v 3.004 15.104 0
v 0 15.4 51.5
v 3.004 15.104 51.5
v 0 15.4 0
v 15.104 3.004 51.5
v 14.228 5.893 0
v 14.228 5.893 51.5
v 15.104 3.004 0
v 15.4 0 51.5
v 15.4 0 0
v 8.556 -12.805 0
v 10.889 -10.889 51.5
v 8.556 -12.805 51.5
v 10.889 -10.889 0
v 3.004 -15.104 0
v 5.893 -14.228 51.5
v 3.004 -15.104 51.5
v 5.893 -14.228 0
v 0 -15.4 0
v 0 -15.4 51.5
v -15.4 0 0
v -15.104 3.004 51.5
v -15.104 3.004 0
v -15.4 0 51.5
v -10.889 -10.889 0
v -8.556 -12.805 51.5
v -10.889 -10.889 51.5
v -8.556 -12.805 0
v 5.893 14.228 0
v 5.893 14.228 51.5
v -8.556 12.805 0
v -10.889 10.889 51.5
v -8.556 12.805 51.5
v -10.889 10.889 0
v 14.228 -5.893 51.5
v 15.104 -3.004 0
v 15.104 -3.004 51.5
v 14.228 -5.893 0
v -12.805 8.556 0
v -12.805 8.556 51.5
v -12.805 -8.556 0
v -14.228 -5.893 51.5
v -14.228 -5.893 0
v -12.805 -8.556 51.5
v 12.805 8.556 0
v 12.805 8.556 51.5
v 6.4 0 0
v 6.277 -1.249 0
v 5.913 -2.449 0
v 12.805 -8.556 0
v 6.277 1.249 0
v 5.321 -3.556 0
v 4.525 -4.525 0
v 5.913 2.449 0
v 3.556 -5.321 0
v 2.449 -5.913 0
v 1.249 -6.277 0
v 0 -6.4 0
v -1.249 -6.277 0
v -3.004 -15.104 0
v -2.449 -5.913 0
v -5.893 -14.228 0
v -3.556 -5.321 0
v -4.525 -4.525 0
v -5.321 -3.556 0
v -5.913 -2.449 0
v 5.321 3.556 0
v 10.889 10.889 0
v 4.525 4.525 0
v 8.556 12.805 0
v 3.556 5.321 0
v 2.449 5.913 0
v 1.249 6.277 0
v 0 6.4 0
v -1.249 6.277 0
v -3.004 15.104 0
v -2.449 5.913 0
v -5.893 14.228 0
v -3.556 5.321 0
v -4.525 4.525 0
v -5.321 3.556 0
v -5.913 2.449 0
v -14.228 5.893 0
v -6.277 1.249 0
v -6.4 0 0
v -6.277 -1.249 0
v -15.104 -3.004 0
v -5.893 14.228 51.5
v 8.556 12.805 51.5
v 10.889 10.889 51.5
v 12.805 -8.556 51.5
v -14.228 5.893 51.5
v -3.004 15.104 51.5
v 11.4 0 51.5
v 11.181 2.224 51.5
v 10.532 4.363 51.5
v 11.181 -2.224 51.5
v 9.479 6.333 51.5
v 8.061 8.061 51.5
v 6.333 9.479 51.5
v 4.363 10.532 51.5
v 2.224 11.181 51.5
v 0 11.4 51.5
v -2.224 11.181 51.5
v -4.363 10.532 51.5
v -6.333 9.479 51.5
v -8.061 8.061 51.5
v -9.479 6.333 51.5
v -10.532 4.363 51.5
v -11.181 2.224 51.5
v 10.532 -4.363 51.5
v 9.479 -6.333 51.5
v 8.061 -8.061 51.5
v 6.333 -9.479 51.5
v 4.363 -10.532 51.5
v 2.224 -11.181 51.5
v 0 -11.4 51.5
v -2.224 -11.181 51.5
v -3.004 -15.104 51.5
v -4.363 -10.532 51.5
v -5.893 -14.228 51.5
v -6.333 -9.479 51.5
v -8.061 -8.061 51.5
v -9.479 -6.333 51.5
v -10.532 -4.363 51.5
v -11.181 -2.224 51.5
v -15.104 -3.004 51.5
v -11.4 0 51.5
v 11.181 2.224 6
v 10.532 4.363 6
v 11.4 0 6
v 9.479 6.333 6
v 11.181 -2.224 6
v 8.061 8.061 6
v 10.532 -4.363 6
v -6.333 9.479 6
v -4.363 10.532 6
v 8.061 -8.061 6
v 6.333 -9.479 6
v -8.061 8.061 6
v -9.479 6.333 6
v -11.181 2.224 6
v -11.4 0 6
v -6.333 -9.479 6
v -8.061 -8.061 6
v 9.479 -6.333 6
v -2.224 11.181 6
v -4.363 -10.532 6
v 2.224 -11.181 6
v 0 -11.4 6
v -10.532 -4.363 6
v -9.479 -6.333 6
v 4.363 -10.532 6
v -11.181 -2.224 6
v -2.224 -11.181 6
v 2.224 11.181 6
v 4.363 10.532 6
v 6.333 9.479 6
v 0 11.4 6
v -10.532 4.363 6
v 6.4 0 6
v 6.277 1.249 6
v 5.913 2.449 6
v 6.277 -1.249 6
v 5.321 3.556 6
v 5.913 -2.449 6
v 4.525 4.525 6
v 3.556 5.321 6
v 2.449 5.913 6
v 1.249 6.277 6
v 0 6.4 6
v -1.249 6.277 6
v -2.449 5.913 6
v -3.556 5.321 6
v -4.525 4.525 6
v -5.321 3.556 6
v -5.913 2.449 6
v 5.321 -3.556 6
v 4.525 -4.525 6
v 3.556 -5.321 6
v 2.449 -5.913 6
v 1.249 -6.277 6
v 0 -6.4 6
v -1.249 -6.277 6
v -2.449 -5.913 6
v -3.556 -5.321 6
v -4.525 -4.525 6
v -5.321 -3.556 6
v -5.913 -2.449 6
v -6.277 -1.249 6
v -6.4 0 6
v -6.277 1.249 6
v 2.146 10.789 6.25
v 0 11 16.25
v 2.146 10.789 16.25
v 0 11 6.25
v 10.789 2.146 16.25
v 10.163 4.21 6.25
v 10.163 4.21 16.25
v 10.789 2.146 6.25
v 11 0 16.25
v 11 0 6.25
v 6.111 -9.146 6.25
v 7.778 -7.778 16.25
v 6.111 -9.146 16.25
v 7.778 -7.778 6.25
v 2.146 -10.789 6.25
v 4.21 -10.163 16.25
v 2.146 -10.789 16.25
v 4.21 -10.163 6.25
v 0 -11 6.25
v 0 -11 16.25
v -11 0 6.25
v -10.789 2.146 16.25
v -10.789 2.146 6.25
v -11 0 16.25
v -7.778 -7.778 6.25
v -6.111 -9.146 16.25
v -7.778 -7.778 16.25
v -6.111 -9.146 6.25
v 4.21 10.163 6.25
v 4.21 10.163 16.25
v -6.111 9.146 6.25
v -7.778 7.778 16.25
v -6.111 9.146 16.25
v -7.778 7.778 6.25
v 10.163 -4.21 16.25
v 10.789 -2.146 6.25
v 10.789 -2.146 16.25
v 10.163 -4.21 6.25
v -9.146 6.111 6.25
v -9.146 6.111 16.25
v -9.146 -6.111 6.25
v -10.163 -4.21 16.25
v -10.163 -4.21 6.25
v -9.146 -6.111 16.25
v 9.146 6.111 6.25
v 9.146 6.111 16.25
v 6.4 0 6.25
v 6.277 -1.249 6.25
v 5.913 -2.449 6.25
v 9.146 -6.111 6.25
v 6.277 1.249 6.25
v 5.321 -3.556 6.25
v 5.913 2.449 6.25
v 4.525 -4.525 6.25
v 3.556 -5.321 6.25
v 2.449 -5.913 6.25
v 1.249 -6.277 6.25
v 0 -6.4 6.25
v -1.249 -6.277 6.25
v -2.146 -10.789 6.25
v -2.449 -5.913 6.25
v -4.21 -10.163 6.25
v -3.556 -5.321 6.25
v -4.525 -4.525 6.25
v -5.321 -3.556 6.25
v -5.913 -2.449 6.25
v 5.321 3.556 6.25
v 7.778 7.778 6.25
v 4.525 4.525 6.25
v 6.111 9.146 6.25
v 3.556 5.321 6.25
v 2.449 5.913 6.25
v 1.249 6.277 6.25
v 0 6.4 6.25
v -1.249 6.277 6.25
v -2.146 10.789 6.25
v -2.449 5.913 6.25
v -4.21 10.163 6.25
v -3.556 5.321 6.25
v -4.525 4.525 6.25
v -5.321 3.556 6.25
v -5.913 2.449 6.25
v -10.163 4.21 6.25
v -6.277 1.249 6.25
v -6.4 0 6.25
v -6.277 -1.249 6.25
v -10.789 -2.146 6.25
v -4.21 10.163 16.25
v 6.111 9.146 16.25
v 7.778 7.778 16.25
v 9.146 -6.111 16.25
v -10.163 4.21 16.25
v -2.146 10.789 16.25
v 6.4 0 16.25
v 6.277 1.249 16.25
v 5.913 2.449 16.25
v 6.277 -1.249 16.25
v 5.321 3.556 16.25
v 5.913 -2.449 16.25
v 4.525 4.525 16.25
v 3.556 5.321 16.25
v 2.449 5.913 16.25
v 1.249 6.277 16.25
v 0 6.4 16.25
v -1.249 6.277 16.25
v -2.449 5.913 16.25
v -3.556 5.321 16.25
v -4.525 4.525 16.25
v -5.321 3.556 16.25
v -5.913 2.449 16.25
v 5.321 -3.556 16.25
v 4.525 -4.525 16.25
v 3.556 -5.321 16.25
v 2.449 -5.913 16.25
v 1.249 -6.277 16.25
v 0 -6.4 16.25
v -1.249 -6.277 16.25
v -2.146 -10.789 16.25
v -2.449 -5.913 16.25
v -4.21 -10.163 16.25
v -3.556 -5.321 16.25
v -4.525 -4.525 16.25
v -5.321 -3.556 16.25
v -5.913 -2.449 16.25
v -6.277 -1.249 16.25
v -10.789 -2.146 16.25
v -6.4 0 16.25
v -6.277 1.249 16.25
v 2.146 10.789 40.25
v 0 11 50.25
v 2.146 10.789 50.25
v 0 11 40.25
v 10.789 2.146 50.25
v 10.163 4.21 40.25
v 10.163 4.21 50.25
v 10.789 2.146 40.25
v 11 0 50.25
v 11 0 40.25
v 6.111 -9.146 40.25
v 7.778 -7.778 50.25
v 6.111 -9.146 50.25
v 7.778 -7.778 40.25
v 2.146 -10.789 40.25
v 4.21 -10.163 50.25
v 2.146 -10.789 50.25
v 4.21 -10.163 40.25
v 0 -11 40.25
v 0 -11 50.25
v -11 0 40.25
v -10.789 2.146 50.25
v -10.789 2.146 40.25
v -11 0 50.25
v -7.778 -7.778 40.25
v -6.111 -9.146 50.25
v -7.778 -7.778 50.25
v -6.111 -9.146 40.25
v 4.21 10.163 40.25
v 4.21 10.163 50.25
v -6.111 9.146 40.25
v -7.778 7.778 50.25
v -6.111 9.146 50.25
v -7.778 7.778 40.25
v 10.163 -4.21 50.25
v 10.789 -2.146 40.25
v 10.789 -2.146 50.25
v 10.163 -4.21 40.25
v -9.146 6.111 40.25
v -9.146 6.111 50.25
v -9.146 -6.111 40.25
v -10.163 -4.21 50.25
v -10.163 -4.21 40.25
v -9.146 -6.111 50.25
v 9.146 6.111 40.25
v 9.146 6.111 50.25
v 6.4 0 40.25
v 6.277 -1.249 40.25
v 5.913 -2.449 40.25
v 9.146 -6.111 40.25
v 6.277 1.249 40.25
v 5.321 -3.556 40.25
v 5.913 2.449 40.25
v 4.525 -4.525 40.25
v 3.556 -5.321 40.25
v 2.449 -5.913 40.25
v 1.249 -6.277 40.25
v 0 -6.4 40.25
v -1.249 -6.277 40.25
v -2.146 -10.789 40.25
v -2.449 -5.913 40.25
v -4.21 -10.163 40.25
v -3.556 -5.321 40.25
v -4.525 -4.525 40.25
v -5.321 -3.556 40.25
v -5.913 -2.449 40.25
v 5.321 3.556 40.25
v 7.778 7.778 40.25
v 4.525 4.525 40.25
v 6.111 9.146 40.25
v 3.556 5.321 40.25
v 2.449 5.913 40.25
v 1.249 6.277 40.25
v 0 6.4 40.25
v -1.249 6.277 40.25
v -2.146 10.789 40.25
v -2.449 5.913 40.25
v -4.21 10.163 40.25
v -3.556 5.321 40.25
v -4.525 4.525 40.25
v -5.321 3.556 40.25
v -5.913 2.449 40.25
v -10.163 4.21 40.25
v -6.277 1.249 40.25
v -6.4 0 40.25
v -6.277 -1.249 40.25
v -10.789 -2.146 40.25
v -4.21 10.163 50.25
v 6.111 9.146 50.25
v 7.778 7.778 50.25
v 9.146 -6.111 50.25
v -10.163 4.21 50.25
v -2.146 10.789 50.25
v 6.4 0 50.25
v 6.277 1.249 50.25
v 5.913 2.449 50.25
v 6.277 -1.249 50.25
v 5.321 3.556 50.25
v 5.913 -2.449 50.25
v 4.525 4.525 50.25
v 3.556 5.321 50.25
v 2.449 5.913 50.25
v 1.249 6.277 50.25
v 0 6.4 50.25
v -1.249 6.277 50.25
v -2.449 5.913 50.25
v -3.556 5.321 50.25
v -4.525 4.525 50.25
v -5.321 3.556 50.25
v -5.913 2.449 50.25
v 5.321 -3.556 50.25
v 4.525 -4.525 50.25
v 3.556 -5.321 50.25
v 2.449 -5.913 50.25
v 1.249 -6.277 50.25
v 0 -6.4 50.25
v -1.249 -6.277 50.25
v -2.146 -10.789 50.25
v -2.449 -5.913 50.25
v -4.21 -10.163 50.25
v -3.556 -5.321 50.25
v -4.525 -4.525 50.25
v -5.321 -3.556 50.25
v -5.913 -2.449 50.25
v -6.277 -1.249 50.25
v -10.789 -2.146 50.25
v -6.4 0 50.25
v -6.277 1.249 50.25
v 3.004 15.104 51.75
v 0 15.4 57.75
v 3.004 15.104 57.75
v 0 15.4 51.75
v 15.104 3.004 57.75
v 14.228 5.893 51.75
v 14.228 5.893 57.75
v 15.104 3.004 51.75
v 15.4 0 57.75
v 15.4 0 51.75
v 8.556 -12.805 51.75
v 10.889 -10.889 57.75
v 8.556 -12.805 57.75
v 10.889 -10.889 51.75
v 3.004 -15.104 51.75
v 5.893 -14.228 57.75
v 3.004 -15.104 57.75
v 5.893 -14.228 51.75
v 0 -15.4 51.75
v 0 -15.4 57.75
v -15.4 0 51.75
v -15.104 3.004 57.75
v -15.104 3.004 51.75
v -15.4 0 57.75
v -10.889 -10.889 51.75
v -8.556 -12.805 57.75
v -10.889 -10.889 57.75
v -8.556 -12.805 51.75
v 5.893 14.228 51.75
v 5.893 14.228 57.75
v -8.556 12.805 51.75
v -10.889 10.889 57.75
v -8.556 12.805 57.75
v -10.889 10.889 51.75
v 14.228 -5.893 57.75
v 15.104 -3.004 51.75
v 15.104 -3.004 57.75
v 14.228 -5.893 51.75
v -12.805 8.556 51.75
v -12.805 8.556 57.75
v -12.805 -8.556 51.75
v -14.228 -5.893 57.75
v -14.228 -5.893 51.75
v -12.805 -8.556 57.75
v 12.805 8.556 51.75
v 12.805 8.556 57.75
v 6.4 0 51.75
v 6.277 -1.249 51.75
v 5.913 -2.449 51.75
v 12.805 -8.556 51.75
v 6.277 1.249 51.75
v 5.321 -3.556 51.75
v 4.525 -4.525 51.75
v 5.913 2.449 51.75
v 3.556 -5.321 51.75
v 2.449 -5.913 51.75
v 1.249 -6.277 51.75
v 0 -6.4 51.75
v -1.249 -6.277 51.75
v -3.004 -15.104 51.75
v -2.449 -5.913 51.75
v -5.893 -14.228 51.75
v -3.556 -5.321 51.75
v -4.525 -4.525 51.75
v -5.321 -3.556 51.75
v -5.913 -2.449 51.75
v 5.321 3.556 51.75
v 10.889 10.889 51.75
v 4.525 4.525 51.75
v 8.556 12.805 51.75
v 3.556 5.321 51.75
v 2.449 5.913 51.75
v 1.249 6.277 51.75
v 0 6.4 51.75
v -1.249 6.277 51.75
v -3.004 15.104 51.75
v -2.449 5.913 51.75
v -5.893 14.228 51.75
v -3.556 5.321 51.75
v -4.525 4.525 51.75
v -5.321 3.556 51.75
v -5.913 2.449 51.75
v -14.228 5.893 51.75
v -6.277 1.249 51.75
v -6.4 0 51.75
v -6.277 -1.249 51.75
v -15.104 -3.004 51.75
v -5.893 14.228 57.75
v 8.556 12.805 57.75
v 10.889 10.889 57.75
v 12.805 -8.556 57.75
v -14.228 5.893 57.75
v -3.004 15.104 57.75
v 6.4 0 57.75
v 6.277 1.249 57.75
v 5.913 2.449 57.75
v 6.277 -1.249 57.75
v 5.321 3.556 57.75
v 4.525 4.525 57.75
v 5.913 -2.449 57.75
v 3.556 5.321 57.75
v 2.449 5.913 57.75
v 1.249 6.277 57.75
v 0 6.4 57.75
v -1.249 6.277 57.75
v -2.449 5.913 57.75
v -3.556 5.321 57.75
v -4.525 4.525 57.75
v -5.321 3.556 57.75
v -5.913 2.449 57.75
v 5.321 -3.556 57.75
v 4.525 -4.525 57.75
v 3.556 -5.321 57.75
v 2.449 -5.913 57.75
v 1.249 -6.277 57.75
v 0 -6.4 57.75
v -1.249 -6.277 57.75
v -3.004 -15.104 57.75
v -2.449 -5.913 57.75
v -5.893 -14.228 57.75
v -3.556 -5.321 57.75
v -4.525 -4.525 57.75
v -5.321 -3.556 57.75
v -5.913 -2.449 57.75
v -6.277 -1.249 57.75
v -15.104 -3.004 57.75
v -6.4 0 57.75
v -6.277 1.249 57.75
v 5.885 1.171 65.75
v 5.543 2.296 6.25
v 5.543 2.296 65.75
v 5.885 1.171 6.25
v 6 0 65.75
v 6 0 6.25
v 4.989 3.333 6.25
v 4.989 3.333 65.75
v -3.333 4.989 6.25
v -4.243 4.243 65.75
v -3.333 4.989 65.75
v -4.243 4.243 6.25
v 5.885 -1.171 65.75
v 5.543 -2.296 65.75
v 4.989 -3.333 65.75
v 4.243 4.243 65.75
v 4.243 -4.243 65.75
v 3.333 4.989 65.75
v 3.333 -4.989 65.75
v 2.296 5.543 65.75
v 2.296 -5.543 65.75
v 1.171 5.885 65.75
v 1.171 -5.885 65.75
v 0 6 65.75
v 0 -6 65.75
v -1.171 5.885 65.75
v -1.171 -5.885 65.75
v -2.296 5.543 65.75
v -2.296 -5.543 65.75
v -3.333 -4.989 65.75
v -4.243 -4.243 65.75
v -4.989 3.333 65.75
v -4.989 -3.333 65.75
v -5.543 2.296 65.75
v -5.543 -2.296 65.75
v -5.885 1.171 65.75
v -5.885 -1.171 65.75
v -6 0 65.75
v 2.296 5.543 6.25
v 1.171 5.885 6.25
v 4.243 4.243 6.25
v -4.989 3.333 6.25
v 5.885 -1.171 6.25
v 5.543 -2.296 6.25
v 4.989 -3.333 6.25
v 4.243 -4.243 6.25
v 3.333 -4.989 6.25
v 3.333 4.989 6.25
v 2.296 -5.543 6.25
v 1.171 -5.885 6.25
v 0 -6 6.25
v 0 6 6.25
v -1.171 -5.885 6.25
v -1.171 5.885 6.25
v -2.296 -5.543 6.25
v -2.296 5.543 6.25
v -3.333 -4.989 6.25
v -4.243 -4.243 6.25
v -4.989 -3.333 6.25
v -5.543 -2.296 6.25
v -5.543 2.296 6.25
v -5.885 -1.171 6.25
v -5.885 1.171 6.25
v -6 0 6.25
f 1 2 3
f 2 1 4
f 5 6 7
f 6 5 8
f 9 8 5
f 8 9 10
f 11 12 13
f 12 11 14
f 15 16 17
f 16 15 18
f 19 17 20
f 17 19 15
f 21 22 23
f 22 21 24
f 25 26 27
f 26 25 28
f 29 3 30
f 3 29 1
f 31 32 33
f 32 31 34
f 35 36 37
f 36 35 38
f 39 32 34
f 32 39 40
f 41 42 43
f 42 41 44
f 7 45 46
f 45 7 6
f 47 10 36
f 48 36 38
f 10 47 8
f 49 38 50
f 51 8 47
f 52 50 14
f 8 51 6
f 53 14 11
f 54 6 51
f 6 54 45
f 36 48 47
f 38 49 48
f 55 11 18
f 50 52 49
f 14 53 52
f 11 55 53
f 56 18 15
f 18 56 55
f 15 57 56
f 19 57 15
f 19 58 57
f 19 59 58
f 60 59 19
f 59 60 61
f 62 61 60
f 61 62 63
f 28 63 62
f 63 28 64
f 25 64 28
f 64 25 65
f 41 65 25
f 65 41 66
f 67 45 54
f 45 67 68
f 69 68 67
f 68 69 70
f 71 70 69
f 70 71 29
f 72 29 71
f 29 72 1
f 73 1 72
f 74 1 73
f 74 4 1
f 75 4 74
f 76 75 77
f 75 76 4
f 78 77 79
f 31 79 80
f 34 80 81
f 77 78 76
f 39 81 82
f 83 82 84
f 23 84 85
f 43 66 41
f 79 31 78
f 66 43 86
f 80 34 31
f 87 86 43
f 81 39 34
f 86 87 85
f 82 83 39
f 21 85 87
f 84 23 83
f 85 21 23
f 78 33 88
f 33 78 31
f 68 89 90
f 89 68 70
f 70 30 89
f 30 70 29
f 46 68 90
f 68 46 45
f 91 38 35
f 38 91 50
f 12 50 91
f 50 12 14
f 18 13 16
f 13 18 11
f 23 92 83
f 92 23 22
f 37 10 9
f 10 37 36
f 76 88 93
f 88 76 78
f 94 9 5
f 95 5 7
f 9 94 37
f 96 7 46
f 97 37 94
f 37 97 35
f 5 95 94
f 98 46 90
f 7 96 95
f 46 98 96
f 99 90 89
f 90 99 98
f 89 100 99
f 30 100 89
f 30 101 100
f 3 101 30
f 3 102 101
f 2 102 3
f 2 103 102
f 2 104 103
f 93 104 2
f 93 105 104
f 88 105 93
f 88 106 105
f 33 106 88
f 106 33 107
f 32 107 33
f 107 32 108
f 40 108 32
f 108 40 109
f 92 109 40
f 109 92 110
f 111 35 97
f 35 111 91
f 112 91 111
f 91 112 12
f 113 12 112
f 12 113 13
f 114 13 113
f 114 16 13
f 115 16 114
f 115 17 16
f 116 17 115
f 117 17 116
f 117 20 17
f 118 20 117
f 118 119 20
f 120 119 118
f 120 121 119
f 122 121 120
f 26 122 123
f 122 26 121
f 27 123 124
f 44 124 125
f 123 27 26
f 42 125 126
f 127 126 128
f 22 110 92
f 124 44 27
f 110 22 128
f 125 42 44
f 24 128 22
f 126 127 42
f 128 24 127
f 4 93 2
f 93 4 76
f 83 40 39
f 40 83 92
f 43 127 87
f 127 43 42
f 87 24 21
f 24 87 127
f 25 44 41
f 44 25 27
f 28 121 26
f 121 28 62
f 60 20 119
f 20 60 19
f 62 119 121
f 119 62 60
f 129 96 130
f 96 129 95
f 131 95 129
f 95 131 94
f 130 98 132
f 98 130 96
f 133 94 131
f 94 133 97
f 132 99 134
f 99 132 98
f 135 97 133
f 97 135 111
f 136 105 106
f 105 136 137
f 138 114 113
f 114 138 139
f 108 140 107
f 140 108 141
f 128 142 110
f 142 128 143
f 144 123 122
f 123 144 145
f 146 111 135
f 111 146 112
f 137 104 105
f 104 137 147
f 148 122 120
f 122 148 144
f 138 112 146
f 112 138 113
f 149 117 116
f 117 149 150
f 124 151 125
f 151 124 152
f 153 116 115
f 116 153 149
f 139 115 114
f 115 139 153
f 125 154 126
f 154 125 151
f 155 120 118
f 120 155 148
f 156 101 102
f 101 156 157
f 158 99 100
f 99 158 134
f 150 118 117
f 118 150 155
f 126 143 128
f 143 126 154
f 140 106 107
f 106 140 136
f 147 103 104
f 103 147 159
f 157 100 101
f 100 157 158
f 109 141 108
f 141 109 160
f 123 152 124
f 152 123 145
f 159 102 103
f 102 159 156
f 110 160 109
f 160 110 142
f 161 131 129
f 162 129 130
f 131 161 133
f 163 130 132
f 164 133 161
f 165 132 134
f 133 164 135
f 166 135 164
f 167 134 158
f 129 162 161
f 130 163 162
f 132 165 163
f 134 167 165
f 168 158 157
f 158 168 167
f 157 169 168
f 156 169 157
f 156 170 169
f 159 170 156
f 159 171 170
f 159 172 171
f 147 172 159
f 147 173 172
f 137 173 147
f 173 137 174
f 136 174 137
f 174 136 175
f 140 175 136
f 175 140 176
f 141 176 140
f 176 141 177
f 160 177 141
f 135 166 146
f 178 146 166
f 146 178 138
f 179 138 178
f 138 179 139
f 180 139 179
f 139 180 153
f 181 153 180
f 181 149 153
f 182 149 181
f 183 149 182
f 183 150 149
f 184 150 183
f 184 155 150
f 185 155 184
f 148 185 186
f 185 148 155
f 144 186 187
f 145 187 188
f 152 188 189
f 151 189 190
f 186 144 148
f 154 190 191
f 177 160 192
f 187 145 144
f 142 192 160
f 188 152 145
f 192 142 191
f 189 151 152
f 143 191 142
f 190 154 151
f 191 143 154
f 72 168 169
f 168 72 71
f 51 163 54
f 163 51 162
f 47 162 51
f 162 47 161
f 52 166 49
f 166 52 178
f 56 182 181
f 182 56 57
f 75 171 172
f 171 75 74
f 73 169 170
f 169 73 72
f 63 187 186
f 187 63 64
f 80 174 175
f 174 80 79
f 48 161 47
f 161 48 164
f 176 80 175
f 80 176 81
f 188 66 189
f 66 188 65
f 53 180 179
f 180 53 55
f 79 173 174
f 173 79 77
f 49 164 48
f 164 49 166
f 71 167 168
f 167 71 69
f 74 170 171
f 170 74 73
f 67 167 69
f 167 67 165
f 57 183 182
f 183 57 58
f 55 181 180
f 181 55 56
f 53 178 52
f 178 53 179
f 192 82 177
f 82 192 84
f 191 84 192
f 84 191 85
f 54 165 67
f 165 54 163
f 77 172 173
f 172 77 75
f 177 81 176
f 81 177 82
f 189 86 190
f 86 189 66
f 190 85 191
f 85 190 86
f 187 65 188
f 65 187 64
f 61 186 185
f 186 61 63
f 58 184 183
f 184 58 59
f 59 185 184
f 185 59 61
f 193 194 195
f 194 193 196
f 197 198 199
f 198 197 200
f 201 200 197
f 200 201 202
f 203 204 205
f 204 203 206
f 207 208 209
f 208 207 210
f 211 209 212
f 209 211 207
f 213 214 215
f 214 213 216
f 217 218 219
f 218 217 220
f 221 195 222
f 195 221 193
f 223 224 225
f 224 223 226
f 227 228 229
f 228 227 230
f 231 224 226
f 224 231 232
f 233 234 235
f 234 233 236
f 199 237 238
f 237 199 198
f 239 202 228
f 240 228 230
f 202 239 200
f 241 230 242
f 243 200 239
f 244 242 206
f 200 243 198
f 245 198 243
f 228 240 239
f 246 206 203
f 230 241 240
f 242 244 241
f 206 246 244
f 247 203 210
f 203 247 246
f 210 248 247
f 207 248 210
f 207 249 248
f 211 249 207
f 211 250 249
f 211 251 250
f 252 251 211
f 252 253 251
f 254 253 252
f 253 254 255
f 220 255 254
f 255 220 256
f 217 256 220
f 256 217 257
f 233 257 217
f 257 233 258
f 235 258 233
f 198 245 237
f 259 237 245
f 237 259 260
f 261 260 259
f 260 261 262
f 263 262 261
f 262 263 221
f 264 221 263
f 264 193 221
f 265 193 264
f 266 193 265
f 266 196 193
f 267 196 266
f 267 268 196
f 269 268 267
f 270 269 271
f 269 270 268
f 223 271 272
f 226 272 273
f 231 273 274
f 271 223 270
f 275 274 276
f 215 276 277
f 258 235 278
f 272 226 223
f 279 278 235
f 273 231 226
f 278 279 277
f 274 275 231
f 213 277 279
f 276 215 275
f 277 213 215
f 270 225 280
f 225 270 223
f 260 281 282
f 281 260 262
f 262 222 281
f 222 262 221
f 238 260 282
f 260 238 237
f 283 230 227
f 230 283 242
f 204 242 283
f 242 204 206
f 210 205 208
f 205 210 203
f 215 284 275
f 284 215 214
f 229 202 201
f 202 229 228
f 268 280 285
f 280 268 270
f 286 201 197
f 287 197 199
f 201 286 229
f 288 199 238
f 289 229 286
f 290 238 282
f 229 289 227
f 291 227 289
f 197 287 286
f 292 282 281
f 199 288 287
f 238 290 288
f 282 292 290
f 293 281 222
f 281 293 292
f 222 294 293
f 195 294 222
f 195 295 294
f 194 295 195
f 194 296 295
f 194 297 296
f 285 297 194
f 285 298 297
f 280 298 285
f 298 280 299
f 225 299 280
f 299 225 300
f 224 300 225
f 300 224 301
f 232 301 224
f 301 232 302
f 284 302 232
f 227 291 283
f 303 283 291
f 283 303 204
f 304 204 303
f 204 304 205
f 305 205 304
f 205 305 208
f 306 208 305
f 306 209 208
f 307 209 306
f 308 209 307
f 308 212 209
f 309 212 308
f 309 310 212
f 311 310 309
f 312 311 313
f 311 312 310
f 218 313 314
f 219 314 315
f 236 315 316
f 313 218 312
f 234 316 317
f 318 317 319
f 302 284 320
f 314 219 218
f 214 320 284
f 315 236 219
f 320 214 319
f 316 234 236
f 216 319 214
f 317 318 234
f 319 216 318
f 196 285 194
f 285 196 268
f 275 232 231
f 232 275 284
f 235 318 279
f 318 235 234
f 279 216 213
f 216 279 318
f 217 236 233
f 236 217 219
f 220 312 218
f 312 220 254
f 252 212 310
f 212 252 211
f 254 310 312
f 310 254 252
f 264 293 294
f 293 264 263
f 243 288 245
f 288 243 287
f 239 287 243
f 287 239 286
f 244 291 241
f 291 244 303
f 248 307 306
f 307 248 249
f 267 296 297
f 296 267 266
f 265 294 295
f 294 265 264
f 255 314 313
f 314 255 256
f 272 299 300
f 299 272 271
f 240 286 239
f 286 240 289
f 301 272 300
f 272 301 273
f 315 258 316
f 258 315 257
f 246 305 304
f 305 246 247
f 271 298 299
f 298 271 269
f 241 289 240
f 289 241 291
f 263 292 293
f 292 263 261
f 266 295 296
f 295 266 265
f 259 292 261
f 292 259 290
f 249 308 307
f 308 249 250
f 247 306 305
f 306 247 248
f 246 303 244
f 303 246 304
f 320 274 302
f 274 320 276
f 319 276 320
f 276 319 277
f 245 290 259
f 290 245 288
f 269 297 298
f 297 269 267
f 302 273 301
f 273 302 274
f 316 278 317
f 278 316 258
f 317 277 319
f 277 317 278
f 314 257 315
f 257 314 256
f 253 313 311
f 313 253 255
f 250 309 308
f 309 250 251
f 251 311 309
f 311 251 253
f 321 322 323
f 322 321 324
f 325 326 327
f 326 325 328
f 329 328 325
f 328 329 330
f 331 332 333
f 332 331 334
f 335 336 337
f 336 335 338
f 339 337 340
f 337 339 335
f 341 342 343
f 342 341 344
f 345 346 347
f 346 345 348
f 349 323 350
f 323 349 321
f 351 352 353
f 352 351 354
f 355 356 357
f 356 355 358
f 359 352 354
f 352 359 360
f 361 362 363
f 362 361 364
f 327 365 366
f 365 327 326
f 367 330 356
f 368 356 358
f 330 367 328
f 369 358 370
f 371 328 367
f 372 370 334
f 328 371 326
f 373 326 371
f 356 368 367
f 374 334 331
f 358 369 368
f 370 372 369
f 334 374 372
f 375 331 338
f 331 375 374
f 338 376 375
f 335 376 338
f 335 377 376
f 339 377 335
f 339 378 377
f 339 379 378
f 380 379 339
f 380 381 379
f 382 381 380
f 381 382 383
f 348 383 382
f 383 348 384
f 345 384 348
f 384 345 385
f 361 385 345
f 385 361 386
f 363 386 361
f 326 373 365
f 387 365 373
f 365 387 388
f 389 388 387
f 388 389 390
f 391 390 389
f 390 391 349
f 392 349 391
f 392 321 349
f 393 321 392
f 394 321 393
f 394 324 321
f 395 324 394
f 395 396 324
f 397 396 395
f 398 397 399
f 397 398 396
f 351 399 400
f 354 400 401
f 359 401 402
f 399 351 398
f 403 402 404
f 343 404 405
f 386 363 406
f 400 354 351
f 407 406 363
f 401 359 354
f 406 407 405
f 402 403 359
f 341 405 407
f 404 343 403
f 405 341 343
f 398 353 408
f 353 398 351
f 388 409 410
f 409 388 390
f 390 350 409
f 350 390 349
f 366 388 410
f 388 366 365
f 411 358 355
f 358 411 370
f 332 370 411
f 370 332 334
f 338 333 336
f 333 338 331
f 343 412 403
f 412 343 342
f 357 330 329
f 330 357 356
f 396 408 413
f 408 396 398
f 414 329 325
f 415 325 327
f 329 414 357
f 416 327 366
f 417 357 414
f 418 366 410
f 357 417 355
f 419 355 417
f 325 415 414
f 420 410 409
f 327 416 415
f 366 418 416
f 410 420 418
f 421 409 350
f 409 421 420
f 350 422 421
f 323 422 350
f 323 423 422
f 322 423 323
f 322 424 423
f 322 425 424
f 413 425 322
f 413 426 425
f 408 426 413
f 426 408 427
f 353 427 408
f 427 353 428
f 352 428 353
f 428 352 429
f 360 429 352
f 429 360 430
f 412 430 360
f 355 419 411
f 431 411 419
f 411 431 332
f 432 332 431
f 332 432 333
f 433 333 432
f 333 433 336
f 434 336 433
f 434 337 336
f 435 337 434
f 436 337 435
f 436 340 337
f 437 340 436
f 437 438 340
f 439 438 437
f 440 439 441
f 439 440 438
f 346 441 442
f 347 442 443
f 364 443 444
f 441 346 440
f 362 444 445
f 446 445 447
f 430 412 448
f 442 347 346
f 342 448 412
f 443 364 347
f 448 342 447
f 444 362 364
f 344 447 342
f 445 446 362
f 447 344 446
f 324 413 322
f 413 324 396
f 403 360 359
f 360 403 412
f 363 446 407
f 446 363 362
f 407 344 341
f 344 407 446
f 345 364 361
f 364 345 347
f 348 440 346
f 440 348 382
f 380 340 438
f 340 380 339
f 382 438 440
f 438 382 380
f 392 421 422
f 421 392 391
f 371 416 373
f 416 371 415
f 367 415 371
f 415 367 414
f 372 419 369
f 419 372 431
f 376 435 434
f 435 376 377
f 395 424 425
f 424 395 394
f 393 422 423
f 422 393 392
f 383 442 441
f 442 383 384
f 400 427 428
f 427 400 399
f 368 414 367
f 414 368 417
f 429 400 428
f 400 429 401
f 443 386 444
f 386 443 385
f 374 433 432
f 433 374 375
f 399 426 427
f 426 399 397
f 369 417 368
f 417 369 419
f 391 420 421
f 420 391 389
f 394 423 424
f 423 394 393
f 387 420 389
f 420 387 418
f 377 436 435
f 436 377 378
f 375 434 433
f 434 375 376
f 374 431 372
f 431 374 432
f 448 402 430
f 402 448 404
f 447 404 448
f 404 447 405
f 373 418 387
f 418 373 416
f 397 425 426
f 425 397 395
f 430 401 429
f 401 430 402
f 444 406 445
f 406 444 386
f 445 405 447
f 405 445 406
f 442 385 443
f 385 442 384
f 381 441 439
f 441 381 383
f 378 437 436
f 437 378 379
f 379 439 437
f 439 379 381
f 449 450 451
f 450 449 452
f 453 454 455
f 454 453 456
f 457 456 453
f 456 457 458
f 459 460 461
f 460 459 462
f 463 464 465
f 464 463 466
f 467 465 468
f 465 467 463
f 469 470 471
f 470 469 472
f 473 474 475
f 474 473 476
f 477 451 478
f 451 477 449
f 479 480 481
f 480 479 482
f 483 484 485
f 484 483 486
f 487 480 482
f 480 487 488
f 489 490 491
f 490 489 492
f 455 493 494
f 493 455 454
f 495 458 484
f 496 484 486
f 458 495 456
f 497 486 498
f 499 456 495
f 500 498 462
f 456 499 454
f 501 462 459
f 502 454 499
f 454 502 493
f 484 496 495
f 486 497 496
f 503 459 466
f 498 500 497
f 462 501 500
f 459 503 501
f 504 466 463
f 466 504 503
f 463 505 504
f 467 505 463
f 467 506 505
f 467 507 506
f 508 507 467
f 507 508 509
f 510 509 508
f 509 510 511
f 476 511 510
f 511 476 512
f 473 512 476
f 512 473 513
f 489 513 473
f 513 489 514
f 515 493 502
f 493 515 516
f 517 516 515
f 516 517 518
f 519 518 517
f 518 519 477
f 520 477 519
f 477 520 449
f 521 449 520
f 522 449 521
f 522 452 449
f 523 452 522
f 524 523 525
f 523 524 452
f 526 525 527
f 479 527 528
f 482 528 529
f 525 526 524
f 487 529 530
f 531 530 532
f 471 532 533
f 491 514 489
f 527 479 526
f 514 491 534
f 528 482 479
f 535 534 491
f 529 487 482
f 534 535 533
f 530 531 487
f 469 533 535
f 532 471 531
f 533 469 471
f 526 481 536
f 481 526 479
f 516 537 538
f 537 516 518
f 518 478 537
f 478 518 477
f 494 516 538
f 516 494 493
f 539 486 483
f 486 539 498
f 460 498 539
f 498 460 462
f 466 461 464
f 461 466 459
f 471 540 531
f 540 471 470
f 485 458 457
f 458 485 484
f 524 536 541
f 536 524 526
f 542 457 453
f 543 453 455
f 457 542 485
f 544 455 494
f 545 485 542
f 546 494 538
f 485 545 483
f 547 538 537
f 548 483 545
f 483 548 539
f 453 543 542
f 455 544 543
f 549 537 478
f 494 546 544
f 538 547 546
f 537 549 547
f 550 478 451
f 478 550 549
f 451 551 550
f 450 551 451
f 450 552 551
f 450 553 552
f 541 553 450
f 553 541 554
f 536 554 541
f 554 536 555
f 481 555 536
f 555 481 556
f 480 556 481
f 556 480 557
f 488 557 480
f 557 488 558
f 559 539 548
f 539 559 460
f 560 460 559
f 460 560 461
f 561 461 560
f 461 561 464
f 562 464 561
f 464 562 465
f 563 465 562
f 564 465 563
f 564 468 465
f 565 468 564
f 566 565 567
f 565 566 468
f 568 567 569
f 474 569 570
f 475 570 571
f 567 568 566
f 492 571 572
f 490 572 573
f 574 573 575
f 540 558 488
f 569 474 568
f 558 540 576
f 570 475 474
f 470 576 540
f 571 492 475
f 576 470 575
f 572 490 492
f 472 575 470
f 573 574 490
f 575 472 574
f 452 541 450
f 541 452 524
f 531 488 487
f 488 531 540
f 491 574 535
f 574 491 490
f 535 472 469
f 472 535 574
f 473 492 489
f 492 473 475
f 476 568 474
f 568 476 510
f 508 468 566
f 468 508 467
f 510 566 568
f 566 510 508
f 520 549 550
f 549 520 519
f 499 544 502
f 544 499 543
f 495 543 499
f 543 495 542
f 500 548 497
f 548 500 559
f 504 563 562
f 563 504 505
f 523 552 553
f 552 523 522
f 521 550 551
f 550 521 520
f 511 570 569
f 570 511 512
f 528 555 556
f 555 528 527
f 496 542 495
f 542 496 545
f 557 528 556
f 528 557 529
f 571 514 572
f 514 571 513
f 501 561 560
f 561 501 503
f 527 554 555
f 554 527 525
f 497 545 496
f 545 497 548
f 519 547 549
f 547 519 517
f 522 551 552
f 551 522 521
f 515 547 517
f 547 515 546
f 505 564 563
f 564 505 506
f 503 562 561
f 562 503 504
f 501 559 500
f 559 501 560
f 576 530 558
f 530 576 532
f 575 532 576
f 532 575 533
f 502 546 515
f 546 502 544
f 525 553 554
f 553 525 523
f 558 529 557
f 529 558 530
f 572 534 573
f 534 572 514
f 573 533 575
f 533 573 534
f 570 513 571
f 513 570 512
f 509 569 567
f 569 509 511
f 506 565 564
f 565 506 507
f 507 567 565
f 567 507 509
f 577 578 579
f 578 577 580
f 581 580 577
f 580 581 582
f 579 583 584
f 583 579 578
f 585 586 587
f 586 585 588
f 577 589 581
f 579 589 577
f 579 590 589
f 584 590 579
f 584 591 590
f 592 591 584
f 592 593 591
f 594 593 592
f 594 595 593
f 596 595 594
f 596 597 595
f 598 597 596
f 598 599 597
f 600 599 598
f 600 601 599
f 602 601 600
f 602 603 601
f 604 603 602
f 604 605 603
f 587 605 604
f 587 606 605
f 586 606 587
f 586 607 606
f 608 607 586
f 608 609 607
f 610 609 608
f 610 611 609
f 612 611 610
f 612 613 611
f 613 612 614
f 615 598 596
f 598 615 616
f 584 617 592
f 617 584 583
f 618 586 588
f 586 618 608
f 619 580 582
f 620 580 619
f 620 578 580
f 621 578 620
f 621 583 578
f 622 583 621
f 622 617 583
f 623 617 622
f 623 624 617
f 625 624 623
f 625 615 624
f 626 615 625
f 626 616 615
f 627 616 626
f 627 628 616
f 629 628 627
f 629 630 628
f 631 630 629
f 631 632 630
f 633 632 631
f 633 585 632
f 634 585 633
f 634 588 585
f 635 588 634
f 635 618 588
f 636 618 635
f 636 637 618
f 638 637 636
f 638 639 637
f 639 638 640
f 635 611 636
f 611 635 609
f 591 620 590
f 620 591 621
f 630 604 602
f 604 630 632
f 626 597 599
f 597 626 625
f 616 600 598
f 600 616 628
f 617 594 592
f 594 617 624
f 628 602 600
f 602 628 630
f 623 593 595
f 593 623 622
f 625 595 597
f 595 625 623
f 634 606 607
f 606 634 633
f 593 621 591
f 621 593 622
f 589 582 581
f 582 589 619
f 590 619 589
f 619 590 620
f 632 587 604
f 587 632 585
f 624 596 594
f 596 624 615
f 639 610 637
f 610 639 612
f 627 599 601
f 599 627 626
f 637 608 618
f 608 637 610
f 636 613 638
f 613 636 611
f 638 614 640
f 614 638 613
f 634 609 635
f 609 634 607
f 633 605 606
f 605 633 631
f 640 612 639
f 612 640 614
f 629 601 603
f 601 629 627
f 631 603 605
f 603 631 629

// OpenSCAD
$fn = 32;

// ------------------------------------------------------------------------
// Shaft station: cup d30.8 x 51.5 mm, shaft d12
// Every part is its own module, assembly() places every instance.
// ------------------------------------------------------------------------

// --- part 1 ---
module housing_cup() {
  difference() {
    cylinder(h = 51.5, d = 30.8);
    translate([0, 0, 6]) cylinder(h = 46.5, d = 22.8);
    translate([0, 0, -1]) cylinder(h = 8, d = 12.8);
  }
}

// --- part 2 ---
module bearing_lower() {
  difference() {
      translate([0, 0, 0]) cylinder(h = 10, d = 22);
      translate([0, 0, -1]) cylinder(h = 12, d = 12.8);
    }
}

// --- part 3 ---
module bearing_upper() {
  difference() {
      translate([0, 0, 0]) cylinder(h = 10, d = 22);
      translate([0, 0, -1]) cylinder(h = 12, d = 12.8);
    }
}

// --- part 4 ---
module station_shaft() {
  translate([0, 0, -29.75]) cylinder(h = 59.5, d = 12);
}

// --- part 5 ---
module station_cover() {
  difference() {
    cylinder(h = 6, d = 30.8);
    translate([0, 0, -1]) cylinder(h = 8, d = 12.8);
  }
}

// --- assembly ---
module assembly() {
  color([0.80, 0.24, 0.20]) translate([0, 0, 0]) rotate([0, 0, 0]) housing_cup();
  color([0.20, 0.45, 0.75]) translate([0, 0, 6.25]) rotate([0, 0, 0]) bearing_lower();
  color([0.25, 0.62, 0.32]) translate([0, 0, 40.25]) rotate([0, 0, 0]) bearing_upper();
  color([0.92, 0.70, 0.18]) translate([0, 0, 36]) rotate([0, 0, 0]) station_shaft();
  color([0.58, 0.35, 0.70]) translate([0, 0, 51.75]) rotate([0, 0, 0]) station_cover();
}

assembly();
